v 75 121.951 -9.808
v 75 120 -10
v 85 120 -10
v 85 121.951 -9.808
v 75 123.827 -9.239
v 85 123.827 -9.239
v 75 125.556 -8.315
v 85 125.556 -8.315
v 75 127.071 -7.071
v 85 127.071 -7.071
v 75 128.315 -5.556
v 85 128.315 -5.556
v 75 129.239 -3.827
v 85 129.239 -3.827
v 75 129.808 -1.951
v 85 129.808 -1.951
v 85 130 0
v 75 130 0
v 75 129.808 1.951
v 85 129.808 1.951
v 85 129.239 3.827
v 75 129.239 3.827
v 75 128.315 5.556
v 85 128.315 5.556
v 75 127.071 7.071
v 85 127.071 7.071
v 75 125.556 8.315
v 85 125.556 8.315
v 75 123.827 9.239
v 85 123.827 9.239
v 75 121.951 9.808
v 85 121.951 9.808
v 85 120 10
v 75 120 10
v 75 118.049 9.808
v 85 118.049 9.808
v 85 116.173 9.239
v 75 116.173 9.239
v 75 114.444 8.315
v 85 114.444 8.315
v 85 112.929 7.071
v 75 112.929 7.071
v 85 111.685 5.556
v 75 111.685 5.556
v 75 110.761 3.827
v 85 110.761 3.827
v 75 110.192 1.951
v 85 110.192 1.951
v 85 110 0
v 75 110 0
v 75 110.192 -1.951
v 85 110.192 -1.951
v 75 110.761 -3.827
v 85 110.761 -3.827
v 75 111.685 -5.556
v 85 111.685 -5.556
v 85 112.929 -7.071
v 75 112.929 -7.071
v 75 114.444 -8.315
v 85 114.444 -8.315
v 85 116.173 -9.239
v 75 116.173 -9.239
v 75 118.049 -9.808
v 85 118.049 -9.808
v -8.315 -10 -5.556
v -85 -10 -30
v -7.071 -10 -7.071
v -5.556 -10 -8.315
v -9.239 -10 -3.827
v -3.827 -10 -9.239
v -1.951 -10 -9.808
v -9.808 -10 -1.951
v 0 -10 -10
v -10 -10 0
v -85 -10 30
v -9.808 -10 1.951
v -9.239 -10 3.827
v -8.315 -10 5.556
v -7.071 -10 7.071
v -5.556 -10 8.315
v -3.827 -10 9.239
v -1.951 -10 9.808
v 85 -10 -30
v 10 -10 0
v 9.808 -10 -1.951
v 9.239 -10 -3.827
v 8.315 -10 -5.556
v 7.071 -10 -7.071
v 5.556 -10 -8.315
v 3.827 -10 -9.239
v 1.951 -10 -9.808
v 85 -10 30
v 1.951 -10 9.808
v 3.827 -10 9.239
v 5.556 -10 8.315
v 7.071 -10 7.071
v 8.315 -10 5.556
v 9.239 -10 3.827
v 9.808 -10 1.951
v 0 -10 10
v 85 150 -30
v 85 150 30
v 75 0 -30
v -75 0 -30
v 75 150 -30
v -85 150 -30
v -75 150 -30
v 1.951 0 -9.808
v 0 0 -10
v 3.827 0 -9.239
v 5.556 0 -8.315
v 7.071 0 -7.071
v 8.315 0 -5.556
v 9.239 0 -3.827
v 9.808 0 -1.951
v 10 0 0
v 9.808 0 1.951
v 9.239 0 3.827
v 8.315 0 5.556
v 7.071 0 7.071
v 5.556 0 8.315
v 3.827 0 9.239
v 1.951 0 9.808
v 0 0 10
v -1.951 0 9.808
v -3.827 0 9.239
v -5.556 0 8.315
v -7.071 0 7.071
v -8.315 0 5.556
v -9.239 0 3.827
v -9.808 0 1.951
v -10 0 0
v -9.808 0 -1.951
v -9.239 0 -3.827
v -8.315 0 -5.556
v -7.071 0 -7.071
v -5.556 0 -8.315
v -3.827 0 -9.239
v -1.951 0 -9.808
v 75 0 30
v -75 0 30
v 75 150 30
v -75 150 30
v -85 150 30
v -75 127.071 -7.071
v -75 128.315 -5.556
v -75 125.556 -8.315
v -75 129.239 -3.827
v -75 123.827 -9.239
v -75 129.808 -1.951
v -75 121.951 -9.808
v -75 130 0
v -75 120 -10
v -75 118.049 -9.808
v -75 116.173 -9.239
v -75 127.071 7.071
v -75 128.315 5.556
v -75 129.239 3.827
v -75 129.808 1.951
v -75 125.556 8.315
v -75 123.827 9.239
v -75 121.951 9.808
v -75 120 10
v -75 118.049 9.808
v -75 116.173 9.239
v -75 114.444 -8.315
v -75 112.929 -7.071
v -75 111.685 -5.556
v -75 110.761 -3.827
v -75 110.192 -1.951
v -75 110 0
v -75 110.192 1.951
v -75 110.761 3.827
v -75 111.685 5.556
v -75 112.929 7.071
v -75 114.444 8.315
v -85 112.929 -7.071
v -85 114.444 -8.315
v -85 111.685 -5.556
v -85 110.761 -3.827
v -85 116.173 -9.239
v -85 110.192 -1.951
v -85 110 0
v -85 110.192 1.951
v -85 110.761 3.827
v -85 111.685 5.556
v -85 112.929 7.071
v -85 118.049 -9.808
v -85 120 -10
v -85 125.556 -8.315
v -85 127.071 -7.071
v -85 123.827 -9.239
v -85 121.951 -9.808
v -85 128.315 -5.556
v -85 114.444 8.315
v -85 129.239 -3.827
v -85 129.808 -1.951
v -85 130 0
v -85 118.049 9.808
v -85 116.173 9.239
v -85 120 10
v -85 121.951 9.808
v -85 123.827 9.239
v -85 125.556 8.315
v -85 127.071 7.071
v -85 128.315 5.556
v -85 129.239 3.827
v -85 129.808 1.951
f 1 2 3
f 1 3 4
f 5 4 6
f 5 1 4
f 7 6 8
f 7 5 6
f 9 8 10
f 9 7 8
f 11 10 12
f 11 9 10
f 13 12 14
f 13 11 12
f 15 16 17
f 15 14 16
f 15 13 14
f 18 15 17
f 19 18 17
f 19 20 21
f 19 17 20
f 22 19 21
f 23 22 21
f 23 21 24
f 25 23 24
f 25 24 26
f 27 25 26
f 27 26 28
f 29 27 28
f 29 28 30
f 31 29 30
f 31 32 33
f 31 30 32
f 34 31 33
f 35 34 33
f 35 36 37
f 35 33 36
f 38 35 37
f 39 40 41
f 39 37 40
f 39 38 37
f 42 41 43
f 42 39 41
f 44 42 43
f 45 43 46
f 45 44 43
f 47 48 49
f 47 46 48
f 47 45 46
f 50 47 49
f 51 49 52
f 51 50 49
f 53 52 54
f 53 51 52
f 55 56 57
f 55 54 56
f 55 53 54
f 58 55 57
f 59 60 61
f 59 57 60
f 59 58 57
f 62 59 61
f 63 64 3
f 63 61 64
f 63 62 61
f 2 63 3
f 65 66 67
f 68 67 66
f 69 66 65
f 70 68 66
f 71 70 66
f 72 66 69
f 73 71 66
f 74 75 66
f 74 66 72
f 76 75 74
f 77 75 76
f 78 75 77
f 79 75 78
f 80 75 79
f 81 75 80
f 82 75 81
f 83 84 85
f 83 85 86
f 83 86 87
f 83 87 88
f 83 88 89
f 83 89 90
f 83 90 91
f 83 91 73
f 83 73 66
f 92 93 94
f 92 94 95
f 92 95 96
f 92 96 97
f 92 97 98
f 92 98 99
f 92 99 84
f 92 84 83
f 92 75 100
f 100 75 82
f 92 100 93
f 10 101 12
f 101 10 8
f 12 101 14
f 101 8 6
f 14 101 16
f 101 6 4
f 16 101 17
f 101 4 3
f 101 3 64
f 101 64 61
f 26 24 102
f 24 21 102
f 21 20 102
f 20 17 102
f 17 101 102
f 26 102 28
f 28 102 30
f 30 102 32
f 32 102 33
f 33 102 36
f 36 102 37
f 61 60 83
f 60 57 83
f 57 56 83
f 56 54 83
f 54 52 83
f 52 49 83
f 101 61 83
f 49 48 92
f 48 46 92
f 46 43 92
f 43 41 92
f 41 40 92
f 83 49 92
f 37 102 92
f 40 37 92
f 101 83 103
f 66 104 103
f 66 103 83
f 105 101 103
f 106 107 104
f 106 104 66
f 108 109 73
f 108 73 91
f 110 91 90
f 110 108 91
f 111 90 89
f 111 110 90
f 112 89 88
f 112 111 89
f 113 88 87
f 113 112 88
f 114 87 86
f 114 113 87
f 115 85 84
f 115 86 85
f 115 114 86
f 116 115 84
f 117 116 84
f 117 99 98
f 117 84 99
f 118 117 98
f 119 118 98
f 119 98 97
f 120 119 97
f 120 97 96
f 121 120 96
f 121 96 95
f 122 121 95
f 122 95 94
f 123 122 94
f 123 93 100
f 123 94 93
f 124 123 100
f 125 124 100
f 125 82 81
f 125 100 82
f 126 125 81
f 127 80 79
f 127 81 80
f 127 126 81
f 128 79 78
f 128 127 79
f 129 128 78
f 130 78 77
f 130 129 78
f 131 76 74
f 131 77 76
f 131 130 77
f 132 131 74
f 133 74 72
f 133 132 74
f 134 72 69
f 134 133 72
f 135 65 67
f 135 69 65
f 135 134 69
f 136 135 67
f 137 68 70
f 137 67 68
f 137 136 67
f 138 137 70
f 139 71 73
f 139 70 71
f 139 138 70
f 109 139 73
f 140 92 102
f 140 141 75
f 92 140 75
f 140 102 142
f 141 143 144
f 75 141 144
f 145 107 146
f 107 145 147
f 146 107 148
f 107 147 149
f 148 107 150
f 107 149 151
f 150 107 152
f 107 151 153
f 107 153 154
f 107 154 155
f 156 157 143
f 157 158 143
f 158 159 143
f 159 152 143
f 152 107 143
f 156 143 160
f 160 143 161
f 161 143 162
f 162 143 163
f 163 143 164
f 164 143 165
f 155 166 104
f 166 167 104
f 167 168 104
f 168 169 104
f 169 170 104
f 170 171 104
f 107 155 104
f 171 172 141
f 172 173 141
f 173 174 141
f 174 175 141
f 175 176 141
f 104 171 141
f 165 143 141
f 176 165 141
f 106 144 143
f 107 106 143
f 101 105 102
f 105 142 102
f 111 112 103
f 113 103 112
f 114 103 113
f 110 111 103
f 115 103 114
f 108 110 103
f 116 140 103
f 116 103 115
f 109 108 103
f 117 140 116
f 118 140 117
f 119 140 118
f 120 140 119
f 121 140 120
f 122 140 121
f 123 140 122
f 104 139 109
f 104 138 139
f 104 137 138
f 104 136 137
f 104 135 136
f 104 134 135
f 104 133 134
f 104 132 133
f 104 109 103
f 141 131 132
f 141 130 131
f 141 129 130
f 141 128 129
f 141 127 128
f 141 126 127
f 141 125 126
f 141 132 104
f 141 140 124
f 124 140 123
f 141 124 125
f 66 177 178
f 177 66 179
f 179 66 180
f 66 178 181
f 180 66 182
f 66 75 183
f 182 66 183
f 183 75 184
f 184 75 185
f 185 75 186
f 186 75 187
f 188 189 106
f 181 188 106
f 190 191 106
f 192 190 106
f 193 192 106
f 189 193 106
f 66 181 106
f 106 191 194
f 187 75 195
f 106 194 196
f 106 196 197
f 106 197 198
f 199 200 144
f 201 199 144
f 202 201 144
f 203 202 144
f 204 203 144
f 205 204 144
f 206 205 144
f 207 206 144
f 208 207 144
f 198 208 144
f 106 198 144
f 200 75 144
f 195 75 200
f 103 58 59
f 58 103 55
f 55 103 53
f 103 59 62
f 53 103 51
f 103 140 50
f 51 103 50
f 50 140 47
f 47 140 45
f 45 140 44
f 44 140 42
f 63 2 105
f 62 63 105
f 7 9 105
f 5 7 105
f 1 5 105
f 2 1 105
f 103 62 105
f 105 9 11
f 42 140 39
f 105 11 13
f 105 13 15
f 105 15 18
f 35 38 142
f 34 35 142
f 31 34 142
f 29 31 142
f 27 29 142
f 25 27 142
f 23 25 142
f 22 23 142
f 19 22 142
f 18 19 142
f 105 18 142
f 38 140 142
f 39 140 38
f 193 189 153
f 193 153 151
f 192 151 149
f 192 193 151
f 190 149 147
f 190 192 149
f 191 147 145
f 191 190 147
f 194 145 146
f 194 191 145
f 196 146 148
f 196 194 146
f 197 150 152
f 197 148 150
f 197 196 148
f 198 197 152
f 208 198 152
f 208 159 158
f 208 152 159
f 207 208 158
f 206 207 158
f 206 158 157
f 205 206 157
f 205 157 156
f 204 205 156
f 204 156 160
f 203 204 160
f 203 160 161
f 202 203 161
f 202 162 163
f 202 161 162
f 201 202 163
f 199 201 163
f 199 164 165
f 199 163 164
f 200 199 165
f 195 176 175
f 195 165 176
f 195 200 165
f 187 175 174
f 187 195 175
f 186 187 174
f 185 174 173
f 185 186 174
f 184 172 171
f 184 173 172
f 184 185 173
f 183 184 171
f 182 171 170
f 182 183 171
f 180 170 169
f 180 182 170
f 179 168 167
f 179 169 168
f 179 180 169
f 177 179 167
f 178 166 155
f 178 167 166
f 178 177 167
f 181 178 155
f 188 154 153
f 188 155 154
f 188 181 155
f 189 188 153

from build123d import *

# Parameters (mm, degrees)
BOSS_EXTRUDE1_DEPTH     = 30
CUT_EXTRUDE1_DEPTH      = 229.691932521
CUT_EXTRUDE1_DEPTH_BACK = 229.691932521
SKETCH2_R               = 10
CUT_EXTRUDE2_DEPTH      = 184.643676722
CUT_EXTRUDE2_DEPTH_BACK = 184.643676722
SKETCH3_R               = 10


with BuildPart() as part:
    # Sketch1 → Boss-Extrude1 (new, symmetric)
    with BuildSketch(Plane.XY):
        Polygon((0, 0), (75, 0), (75, 150), (85, 150), (85, -10), (0, -10), (-85, -10), (-85, 150), (-75, 150), (-75, 0), align=None)
    extrude(amount=BOSS_EXTRUDE1_DEPTH, both=True)

    # Sketch2 → Cut-Extrude1 (cut, two sides: drawn at the far end of the back side and taken through both)
    with BuildSketch(Plane(origin=(85, 0, 0), x_dir=(0, 0, -1), z_dir=(1, 0, 0)).offset(-CUT_EXTRUDE1_DEPTH_BACK)):
        with Locations((0, 120)):
            Circle(SKETCH2_R)
    extrude(amount=CUT_EXTRUDE1_DEPTH + CUT_EXTRUDE1_DEPTH_BACK, mode=Mode.SUBTRACT)

    # Sketch3 → Cut-Extrude2 (cut, two sides: drawn at the far end of the back side and taken through both)
    with BuildSketch(Plane.XZ.offset(10).offset(-CUT_EXTRUDE2_DEPTH_BACK)):
        with Locations(Location((0, 0, 0), (0, 0, 270))):
            Circle(SKETCH3_R)
    extrude(amount=CUT_EXTRUDE2_DEPTH + CUT_EXTRUDE2_DEPTH_BACK, mode=Mode.SUBTRACT)


solid = part.part
